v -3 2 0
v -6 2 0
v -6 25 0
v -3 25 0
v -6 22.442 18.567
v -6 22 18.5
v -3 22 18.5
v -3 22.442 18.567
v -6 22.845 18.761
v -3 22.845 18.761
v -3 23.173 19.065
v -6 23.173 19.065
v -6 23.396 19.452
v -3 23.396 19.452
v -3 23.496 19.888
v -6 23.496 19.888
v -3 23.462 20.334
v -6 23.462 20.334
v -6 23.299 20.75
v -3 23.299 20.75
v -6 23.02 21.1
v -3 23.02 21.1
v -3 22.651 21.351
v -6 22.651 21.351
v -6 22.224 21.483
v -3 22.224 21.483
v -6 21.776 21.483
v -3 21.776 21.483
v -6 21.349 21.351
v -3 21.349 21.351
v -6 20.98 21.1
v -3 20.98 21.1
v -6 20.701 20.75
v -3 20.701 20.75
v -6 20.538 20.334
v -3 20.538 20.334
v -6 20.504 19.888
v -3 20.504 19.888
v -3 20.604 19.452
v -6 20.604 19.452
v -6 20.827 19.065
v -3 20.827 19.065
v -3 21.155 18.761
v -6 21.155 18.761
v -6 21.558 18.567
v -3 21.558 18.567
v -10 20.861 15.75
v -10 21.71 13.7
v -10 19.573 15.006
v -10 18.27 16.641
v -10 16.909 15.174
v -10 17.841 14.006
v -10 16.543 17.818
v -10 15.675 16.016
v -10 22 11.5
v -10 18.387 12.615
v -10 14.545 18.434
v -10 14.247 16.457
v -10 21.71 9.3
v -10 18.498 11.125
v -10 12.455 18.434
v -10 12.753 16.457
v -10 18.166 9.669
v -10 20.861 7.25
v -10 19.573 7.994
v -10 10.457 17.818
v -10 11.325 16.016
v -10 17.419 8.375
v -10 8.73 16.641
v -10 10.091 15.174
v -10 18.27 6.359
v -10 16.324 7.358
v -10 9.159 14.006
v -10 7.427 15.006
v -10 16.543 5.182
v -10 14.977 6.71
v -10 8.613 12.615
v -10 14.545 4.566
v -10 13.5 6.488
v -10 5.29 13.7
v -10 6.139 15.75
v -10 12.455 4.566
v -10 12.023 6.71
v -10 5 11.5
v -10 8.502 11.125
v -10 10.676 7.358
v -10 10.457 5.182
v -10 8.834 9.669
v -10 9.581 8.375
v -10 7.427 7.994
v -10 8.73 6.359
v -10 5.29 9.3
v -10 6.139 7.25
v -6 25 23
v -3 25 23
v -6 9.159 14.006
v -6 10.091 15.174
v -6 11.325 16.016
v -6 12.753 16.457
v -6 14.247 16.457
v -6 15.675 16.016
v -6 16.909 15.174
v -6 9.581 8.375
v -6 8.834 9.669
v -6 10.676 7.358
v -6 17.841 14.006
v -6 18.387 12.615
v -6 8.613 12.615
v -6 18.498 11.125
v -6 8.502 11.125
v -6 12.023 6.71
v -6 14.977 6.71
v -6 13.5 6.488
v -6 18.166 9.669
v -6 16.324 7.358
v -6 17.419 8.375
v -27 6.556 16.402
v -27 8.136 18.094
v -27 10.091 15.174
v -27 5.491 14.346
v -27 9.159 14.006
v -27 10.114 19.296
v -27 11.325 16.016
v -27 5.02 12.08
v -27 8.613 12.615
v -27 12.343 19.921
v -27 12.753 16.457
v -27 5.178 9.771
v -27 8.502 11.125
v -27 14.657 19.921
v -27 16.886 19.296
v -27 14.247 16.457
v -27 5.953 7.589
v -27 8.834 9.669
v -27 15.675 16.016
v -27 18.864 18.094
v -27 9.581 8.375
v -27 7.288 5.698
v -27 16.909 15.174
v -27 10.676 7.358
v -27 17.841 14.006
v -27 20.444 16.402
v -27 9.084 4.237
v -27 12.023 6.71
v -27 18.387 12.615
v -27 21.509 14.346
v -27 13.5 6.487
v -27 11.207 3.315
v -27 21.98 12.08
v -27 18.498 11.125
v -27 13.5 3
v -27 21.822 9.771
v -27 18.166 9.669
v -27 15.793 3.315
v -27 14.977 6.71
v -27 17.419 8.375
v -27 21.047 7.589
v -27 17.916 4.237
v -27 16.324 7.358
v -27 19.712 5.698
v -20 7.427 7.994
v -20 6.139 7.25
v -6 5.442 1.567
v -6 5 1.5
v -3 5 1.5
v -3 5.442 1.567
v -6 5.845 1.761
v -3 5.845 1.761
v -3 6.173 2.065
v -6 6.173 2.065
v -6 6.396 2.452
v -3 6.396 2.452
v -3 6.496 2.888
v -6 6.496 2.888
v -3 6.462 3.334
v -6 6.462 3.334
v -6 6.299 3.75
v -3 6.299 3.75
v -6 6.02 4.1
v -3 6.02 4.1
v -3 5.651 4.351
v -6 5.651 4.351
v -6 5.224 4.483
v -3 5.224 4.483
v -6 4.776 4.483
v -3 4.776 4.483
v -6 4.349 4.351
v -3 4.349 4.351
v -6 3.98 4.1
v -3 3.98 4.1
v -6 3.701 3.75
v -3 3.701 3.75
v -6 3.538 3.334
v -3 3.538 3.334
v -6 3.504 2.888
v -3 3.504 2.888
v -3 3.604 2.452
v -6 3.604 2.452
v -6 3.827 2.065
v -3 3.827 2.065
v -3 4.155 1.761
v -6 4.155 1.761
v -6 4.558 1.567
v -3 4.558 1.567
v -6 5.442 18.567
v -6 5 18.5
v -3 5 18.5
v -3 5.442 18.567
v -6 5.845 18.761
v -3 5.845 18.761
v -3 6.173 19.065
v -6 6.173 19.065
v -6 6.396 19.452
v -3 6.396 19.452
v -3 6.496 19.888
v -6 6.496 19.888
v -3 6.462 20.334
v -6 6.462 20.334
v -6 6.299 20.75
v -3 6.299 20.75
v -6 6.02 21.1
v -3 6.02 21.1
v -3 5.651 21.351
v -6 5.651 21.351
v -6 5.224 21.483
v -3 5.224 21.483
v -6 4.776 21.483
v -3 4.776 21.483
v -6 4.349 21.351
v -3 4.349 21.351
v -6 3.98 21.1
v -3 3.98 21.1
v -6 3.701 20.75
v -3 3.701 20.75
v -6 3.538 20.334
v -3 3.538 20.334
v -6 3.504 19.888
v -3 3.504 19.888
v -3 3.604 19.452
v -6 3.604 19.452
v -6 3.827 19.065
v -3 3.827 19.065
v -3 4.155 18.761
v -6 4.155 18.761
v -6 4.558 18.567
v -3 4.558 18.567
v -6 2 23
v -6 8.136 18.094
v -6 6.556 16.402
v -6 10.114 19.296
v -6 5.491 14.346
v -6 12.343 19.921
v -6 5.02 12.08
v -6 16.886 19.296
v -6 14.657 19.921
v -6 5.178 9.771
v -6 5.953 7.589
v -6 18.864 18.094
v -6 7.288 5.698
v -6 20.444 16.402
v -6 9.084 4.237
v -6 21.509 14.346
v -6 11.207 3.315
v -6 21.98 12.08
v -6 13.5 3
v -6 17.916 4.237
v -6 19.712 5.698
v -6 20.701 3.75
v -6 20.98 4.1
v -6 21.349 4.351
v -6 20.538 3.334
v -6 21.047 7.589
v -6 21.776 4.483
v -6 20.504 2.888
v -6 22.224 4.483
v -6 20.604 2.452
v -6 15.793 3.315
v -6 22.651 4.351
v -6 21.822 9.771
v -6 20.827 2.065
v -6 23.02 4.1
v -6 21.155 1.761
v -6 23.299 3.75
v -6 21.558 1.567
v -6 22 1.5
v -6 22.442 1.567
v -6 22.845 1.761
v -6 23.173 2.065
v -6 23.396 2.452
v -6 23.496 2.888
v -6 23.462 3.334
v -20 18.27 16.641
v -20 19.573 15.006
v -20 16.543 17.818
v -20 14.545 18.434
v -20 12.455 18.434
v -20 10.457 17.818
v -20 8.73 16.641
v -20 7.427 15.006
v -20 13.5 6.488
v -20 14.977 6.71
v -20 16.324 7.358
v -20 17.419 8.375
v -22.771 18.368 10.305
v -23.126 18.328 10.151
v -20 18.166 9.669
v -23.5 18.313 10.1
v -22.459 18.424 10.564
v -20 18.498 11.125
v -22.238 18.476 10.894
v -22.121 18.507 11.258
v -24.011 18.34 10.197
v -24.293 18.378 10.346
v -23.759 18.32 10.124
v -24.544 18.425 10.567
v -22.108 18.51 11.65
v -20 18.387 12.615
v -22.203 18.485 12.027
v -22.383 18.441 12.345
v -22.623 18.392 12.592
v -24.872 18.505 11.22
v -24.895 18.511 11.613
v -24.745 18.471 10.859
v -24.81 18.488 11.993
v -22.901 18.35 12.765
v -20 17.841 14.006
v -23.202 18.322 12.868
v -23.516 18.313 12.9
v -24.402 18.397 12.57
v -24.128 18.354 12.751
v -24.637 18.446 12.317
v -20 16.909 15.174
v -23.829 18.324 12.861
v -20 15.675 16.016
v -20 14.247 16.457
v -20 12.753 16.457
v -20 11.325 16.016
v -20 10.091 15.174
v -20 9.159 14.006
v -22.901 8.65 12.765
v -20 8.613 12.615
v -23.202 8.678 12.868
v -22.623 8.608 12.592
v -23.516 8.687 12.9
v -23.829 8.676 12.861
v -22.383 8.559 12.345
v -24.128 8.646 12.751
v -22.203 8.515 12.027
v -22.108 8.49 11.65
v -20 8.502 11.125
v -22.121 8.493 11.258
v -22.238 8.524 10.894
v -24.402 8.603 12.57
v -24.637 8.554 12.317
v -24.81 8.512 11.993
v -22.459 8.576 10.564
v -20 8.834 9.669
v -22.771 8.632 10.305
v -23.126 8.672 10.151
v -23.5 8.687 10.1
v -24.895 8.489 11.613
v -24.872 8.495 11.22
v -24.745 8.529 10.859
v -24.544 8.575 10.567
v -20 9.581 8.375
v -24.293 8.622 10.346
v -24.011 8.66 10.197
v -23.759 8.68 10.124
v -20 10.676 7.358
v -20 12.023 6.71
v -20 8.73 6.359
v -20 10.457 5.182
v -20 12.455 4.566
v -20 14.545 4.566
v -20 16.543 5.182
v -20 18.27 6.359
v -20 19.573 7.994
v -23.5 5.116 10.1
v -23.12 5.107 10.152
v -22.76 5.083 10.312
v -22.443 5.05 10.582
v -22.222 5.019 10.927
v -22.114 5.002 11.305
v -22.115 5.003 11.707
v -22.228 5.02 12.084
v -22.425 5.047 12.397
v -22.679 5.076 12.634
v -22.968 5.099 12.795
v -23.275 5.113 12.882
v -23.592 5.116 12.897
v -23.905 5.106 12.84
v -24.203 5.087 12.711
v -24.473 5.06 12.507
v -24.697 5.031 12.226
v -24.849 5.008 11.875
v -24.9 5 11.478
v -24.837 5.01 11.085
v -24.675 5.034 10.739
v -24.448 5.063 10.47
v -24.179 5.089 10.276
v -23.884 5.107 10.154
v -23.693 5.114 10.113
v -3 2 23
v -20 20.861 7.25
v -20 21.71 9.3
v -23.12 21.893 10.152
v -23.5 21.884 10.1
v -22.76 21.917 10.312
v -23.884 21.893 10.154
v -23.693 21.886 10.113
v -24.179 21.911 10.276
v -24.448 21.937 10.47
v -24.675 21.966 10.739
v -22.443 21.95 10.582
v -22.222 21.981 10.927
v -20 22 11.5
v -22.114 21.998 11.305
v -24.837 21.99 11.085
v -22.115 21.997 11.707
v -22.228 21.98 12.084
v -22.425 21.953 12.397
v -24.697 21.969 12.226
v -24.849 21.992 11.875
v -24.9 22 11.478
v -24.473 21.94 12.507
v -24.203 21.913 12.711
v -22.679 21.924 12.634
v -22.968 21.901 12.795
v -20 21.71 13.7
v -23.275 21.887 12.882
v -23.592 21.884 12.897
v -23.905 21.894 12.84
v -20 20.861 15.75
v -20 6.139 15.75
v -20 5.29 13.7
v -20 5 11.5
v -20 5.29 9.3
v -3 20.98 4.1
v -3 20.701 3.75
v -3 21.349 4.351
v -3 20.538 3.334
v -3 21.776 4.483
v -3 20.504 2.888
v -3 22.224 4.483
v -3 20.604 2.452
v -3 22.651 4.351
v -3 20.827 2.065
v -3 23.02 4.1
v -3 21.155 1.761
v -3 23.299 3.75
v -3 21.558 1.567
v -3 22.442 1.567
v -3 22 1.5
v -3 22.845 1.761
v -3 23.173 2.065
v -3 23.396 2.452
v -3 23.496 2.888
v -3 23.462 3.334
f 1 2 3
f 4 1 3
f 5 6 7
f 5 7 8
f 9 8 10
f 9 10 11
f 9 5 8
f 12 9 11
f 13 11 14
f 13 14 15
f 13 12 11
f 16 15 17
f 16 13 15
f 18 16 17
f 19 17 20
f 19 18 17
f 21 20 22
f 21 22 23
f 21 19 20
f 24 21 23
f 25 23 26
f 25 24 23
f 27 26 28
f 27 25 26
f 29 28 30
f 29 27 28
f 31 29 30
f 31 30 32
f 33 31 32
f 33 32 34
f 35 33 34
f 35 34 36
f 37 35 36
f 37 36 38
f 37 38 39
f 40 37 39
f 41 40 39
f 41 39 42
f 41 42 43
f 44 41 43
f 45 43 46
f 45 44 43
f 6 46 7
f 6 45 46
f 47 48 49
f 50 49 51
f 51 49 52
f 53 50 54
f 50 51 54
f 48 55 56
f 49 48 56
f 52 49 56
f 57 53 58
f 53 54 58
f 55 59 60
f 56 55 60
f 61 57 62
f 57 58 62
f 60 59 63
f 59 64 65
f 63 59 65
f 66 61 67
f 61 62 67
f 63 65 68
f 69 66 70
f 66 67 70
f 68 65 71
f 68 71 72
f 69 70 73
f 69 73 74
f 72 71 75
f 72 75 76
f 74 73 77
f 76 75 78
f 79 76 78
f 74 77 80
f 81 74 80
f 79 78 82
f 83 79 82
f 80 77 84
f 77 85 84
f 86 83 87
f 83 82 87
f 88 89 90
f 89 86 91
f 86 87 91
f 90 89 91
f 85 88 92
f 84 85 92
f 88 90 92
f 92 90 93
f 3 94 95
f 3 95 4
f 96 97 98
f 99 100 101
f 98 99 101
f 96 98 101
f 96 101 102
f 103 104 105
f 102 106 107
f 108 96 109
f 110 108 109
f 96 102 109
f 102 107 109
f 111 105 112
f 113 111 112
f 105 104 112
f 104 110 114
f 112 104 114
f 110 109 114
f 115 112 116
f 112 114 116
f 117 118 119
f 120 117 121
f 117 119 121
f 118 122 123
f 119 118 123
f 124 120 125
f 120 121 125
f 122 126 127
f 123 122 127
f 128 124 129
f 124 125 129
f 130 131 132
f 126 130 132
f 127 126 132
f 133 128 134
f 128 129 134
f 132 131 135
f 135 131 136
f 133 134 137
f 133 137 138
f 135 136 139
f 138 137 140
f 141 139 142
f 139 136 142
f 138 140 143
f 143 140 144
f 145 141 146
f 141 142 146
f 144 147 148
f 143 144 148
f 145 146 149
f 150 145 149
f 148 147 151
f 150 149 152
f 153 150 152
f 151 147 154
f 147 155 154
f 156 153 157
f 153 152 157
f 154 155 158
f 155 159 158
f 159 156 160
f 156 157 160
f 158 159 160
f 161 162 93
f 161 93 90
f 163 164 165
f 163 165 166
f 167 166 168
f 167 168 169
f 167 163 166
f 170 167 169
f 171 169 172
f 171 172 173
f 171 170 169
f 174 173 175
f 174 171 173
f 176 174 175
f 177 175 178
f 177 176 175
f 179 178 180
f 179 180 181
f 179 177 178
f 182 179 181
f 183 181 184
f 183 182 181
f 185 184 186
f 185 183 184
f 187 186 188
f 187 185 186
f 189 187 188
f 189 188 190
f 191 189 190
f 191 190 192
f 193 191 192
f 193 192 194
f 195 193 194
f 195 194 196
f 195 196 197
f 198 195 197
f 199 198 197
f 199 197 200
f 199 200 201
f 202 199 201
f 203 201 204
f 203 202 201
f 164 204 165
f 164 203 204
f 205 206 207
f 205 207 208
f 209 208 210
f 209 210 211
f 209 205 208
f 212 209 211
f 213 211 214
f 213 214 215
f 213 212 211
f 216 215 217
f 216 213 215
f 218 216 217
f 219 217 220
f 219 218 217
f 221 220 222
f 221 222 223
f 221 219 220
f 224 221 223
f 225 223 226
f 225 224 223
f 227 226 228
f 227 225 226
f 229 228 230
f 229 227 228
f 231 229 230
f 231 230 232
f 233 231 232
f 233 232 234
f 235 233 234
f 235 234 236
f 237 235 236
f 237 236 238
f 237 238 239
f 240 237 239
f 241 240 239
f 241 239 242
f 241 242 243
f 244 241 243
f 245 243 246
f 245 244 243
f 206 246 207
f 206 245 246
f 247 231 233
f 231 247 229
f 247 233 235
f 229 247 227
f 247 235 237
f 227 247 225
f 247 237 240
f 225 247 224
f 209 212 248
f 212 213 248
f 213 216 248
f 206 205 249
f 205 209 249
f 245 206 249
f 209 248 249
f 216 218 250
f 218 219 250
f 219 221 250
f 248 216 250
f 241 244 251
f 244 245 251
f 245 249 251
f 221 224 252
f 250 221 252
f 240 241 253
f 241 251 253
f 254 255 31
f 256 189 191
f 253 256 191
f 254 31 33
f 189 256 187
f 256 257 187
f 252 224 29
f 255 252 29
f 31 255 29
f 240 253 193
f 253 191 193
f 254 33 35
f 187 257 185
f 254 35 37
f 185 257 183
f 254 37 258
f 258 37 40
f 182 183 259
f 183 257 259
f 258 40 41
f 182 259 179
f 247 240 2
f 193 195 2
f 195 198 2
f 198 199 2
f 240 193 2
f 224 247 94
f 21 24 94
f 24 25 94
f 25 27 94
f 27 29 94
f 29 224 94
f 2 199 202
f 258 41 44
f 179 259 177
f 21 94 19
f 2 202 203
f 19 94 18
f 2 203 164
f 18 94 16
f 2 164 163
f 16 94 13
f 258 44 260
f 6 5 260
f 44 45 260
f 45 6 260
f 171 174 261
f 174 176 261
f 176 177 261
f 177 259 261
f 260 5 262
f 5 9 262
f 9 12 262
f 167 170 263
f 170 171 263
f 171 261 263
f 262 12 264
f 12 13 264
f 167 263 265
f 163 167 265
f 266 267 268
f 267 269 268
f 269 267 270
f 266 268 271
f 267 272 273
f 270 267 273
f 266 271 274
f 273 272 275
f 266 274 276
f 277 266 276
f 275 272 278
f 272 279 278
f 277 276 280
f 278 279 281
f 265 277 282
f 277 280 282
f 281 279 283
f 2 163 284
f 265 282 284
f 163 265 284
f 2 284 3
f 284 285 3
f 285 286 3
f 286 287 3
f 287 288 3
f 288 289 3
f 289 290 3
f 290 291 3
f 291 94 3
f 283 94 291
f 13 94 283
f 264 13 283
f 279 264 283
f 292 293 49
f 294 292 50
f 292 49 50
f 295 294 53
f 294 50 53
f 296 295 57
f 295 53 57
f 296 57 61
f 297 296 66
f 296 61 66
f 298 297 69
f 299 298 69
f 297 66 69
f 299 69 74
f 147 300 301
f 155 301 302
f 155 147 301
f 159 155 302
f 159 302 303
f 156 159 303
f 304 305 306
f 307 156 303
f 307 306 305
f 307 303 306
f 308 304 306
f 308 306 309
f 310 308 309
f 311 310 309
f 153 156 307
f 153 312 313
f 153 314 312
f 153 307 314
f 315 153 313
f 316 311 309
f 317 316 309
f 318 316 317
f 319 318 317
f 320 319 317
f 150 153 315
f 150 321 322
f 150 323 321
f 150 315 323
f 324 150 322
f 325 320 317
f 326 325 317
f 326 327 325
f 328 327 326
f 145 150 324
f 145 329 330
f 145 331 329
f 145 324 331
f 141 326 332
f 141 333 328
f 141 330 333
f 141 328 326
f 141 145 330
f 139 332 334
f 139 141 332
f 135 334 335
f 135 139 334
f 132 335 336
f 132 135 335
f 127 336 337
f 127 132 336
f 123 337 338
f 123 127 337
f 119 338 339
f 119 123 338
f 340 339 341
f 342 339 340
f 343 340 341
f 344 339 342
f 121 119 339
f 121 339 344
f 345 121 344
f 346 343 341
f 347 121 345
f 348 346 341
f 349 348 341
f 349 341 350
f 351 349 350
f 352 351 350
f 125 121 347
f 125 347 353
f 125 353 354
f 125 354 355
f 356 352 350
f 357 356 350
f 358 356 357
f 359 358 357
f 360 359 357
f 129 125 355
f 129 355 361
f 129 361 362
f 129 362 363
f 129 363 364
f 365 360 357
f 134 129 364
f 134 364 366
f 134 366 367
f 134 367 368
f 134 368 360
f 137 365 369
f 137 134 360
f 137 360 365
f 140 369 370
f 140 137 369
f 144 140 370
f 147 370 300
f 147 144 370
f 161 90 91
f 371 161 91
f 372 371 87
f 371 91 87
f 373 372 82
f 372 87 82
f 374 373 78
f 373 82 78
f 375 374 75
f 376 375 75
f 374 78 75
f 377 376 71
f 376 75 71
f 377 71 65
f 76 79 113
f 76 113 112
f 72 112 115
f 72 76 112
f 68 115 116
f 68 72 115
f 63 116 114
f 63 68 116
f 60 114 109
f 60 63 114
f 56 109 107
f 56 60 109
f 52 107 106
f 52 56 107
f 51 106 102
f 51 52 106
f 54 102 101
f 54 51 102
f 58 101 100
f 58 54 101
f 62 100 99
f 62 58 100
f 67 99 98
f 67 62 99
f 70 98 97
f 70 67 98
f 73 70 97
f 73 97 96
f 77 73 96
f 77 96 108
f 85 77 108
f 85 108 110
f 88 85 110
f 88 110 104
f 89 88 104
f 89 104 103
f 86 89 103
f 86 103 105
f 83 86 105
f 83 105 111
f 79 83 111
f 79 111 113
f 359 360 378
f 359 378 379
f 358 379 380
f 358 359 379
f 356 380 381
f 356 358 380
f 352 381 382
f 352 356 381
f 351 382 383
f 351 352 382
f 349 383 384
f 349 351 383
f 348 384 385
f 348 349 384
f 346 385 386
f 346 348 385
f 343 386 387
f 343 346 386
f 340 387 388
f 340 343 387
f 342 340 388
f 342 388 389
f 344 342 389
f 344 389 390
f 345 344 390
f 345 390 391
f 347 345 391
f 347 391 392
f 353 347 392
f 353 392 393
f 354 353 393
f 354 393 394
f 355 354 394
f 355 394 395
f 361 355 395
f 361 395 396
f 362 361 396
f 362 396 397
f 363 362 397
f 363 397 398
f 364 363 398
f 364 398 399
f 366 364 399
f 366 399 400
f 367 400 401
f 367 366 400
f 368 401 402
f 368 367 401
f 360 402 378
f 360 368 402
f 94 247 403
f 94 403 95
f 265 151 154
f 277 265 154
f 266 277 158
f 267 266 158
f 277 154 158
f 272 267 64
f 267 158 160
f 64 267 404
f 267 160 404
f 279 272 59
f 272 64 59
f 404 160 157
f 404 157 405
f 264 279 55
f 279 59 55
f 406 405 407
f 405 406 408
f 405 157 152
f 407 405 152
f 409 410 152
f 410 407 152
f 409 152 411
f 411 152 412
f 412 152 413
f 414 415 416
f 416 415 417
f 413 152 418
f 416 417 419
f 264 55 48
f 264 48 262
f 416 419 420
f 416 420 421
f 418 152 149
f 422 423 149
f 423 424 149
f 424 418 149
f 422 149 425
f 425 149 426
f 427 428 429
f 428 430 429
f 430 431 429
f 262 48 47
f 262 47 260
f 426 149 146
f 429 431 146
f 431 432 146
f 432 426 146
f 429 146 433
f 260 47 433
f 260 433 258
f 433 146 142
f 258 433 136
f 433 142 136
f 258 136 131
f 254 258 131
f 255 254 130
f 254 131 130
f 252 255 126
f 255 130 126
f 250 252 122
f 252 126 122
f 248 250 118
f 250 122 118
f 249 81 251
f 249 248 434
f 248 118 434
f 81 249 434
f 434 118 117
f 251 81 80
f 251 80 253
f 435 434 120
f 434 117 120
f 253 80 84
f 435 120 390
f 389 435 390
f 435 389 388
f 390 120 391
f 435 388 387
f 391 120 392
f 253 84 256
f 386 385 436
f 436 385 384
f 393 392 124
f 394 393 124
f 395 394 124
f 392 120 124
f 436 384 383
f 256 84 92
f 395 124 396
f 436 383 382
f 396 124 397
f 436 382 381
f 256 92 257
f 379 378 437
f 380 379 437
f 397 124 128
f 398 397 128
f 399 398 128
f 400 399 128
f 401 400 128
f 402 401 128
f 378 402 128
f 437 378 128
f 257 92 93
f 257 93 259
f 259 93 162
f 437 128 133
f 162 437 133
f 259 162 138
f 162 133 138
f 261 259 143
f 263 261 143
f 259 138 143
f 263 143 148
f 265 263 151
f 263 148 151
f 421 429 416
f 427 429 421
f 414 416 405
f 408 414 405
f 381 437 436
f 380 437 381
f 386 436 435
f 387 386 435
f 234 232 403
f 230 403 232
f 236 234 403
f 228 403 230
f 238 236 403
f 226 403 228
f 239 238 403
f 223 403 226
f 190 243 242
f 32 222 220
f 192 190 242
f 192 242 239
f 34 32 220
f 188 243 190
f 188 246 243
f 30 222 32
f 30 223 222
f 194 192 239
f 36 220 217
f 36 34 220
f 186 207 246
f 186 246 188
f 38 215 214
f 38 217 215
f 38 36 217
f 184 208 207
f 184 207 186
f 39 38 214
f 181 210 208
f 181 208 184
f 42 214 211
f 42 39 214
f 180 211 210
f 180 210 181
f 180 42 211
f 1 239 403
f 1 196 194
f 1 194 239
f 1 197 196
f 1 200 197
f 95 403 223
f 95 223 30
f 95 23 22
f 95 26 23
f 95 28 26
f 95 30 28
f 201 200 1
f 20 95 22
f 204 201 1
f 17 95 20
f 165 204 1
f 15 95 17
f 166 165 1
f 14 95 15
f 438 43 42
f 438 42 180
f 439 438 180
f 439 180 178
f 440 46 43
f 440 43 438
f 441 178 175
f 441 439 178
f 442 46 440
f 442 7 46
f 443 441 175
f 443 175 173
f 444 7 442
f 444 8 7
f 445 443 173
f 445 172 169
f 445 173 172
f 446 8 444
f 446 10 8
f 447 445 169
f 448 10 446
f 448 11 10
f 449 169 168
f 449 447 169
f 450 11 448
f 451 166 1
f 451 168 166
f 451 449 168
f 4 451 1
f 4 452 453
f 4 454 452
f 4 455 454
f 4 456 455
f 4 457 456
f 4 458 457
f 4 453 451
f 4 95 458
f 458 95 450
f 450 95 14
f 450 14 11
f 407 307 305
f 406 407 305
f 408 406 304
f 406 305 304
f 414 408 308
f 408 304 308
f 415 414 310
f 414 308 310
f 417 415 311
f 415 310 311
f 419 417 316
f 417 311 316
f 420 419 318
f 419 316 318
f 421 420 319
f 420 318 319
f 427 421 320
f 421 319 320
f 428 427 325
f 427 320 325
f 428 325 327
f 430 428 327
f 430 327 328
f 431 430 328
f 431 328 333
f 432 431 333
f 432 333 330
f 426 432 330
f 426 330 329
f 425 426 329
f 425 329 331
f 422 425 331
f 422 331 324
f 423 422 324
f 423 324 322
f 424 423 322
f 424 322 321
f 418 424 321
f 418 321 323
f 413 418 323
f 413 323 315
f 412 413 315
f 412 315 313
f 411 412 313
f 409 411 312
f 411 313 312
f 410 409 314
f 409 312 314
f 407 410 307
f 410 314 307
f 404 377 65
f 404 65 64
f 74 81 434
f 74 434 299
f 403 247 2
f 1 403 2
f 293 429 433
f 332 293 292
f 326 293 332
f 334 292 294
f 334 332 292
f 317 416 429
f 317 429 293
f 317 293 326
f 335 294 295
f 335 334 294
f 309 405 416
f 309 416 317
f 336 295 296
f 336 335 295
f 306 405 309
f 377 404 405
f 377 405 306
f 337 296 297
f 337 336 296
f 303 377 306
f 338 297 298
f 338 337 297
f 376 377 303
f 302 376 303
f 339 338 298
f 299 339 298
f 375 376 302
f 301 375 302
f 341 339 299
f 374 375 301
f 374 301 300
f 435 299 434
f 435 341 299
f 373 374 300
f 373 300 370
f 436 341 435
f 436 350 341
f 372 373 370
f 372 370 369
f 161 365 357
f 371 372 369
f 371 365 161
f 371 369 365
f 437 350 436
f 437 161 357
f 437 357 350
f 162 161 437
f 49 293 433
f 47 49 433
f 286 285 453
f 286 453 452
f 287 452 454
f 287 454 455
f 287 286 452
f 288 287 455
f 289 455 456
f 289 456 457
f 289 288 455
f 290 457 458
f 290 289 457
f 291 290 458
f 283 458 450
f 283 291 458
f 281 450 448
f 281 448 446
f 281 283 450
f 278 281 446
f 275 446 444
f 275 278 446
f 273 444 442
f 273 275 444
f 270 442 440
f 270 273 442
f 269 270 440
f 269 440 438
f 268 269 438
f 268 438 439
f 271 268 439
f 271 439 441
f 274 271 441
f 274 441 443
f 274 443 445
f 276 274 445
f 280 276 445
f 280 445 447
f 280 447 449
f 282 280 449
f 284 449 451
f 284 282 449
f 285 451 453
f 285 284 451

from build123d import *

# Parameters (mm, degrees)
SKETCH012_R             = 8.5
SKETCH012_R_2           = 5.0125
PAD009_DEPTH            = 21
SKETCH013_W             = 2
SKETCH013_H             = 10
SKETCH014_W             = 1.4875
SKETCH014_H             = 10
GROOVE002_ANGLE         = -60
SKETCH015_R             = 1.4
POCKET002_DEPTH         = 8.501
POCKET002_DEPTH_BACK    = 8.501
SKETCH016_W             = 23
SKETCH016_H             = 23
SKETCH016_R             = 1.5
PAD010_DEPTH            = 3
BODY006_PLACEMENT_ANGLE = 90


with BuildPart() as part:
    # Sketch012 → Pad009 (new body)
    with BuildSketch(Plane.XY):
        Circle(SKETCH012_R)
        Circle(SKETCH012_R_2, mode=Mode.SUBTRACT)
    extrude(amount=PAD009_DEPTH)

    # Sketch013 → Groove001 (revolve, cut)
    with BuildSketch(Plane.YZ):
        with Locations((-6.0125, 12)):
            Rectangle(SKETCH013_W, SKETCH013_H)
        with Locations((6.0125, 12)):
            Rectangle(SKETCH013_W, SKETCH013_H)
    revolve(axis=Axis((0, 0, 0), (0, 0, 1)), mode=Mode.SUBTRACT)

    # Sketch014 → Groove002 (revolve, symmetric, cut)
    with BuildSketch(Plane.YZ) as groove002_sk:
        with Locations((-7.75625, 12)):
            Rectangle(SKETCH014_W, SKETCH014_H)
        with Locations((7.75625, 12)):
            Rectangle(SKETCH014_W, SKETCH014_H)
    revolve(axis=Axis((0, 0, 0), (0, 0, 1)), revolution_arc=GROOVE002_ANGLE / 2, mode=Mode.SUBTRACT)
    revolve(groove002_sk.sketch, axis=Axis((0, 0, 0), (0, 0, -1)), revolution_arc=GROOVE002_ANGLE / 2, mode=Mode.SUBTRACT)

    # Sketch015 → Pocket002 (cut, two sides)
    with BuildSketch(Plane.XZ) as pocket002_sk:
        with Locations((0, 3.5)):
            Circle(SKETCH015_R)
    extrude(amount=-POCKET002_DEPTH, mode=Mode.SUBTRACT)
    extrude(pocket002_sk.sketch, amount=POCKET002_DEPTH_BACK, mode=Mode.SUBTRACT)

    # Sketch016 → Pad010 (join)
    with BuildSketch(Plane.XY.offset(21)):
        Rectangle(SKETCH016_W, SKETCH016_H)
        with Locations((-8.5, 8.5)):
            Circle(SKETCH016_R, mode=Mode.SUBTRACT)
        with Locations((-8.5, -8.5)):
            Circle(SKETCH016_R, mode=Mode.SUBTRACT)
        with Locations((8.5, 8.5)):
            Circle(SKETCH016_R, mode=Mode.SUBTRACT)
        with Locations((8.5, -8.5)):
            Circle(SKETCH016_R, mode=Mode.SUBTRACT)
    extrude(amount=PAD010_DEPTH)


with BuildPart() as part_1:
    # Body006 placement: moved
    add(part.part.moved(Location((-27, 13.5, 11.5))).rotate(Axis((-27, 13.5, 11.5), (0, 1, 0)), BODY006_PLACEMENT_ANGLE))


solid = part_1.part
